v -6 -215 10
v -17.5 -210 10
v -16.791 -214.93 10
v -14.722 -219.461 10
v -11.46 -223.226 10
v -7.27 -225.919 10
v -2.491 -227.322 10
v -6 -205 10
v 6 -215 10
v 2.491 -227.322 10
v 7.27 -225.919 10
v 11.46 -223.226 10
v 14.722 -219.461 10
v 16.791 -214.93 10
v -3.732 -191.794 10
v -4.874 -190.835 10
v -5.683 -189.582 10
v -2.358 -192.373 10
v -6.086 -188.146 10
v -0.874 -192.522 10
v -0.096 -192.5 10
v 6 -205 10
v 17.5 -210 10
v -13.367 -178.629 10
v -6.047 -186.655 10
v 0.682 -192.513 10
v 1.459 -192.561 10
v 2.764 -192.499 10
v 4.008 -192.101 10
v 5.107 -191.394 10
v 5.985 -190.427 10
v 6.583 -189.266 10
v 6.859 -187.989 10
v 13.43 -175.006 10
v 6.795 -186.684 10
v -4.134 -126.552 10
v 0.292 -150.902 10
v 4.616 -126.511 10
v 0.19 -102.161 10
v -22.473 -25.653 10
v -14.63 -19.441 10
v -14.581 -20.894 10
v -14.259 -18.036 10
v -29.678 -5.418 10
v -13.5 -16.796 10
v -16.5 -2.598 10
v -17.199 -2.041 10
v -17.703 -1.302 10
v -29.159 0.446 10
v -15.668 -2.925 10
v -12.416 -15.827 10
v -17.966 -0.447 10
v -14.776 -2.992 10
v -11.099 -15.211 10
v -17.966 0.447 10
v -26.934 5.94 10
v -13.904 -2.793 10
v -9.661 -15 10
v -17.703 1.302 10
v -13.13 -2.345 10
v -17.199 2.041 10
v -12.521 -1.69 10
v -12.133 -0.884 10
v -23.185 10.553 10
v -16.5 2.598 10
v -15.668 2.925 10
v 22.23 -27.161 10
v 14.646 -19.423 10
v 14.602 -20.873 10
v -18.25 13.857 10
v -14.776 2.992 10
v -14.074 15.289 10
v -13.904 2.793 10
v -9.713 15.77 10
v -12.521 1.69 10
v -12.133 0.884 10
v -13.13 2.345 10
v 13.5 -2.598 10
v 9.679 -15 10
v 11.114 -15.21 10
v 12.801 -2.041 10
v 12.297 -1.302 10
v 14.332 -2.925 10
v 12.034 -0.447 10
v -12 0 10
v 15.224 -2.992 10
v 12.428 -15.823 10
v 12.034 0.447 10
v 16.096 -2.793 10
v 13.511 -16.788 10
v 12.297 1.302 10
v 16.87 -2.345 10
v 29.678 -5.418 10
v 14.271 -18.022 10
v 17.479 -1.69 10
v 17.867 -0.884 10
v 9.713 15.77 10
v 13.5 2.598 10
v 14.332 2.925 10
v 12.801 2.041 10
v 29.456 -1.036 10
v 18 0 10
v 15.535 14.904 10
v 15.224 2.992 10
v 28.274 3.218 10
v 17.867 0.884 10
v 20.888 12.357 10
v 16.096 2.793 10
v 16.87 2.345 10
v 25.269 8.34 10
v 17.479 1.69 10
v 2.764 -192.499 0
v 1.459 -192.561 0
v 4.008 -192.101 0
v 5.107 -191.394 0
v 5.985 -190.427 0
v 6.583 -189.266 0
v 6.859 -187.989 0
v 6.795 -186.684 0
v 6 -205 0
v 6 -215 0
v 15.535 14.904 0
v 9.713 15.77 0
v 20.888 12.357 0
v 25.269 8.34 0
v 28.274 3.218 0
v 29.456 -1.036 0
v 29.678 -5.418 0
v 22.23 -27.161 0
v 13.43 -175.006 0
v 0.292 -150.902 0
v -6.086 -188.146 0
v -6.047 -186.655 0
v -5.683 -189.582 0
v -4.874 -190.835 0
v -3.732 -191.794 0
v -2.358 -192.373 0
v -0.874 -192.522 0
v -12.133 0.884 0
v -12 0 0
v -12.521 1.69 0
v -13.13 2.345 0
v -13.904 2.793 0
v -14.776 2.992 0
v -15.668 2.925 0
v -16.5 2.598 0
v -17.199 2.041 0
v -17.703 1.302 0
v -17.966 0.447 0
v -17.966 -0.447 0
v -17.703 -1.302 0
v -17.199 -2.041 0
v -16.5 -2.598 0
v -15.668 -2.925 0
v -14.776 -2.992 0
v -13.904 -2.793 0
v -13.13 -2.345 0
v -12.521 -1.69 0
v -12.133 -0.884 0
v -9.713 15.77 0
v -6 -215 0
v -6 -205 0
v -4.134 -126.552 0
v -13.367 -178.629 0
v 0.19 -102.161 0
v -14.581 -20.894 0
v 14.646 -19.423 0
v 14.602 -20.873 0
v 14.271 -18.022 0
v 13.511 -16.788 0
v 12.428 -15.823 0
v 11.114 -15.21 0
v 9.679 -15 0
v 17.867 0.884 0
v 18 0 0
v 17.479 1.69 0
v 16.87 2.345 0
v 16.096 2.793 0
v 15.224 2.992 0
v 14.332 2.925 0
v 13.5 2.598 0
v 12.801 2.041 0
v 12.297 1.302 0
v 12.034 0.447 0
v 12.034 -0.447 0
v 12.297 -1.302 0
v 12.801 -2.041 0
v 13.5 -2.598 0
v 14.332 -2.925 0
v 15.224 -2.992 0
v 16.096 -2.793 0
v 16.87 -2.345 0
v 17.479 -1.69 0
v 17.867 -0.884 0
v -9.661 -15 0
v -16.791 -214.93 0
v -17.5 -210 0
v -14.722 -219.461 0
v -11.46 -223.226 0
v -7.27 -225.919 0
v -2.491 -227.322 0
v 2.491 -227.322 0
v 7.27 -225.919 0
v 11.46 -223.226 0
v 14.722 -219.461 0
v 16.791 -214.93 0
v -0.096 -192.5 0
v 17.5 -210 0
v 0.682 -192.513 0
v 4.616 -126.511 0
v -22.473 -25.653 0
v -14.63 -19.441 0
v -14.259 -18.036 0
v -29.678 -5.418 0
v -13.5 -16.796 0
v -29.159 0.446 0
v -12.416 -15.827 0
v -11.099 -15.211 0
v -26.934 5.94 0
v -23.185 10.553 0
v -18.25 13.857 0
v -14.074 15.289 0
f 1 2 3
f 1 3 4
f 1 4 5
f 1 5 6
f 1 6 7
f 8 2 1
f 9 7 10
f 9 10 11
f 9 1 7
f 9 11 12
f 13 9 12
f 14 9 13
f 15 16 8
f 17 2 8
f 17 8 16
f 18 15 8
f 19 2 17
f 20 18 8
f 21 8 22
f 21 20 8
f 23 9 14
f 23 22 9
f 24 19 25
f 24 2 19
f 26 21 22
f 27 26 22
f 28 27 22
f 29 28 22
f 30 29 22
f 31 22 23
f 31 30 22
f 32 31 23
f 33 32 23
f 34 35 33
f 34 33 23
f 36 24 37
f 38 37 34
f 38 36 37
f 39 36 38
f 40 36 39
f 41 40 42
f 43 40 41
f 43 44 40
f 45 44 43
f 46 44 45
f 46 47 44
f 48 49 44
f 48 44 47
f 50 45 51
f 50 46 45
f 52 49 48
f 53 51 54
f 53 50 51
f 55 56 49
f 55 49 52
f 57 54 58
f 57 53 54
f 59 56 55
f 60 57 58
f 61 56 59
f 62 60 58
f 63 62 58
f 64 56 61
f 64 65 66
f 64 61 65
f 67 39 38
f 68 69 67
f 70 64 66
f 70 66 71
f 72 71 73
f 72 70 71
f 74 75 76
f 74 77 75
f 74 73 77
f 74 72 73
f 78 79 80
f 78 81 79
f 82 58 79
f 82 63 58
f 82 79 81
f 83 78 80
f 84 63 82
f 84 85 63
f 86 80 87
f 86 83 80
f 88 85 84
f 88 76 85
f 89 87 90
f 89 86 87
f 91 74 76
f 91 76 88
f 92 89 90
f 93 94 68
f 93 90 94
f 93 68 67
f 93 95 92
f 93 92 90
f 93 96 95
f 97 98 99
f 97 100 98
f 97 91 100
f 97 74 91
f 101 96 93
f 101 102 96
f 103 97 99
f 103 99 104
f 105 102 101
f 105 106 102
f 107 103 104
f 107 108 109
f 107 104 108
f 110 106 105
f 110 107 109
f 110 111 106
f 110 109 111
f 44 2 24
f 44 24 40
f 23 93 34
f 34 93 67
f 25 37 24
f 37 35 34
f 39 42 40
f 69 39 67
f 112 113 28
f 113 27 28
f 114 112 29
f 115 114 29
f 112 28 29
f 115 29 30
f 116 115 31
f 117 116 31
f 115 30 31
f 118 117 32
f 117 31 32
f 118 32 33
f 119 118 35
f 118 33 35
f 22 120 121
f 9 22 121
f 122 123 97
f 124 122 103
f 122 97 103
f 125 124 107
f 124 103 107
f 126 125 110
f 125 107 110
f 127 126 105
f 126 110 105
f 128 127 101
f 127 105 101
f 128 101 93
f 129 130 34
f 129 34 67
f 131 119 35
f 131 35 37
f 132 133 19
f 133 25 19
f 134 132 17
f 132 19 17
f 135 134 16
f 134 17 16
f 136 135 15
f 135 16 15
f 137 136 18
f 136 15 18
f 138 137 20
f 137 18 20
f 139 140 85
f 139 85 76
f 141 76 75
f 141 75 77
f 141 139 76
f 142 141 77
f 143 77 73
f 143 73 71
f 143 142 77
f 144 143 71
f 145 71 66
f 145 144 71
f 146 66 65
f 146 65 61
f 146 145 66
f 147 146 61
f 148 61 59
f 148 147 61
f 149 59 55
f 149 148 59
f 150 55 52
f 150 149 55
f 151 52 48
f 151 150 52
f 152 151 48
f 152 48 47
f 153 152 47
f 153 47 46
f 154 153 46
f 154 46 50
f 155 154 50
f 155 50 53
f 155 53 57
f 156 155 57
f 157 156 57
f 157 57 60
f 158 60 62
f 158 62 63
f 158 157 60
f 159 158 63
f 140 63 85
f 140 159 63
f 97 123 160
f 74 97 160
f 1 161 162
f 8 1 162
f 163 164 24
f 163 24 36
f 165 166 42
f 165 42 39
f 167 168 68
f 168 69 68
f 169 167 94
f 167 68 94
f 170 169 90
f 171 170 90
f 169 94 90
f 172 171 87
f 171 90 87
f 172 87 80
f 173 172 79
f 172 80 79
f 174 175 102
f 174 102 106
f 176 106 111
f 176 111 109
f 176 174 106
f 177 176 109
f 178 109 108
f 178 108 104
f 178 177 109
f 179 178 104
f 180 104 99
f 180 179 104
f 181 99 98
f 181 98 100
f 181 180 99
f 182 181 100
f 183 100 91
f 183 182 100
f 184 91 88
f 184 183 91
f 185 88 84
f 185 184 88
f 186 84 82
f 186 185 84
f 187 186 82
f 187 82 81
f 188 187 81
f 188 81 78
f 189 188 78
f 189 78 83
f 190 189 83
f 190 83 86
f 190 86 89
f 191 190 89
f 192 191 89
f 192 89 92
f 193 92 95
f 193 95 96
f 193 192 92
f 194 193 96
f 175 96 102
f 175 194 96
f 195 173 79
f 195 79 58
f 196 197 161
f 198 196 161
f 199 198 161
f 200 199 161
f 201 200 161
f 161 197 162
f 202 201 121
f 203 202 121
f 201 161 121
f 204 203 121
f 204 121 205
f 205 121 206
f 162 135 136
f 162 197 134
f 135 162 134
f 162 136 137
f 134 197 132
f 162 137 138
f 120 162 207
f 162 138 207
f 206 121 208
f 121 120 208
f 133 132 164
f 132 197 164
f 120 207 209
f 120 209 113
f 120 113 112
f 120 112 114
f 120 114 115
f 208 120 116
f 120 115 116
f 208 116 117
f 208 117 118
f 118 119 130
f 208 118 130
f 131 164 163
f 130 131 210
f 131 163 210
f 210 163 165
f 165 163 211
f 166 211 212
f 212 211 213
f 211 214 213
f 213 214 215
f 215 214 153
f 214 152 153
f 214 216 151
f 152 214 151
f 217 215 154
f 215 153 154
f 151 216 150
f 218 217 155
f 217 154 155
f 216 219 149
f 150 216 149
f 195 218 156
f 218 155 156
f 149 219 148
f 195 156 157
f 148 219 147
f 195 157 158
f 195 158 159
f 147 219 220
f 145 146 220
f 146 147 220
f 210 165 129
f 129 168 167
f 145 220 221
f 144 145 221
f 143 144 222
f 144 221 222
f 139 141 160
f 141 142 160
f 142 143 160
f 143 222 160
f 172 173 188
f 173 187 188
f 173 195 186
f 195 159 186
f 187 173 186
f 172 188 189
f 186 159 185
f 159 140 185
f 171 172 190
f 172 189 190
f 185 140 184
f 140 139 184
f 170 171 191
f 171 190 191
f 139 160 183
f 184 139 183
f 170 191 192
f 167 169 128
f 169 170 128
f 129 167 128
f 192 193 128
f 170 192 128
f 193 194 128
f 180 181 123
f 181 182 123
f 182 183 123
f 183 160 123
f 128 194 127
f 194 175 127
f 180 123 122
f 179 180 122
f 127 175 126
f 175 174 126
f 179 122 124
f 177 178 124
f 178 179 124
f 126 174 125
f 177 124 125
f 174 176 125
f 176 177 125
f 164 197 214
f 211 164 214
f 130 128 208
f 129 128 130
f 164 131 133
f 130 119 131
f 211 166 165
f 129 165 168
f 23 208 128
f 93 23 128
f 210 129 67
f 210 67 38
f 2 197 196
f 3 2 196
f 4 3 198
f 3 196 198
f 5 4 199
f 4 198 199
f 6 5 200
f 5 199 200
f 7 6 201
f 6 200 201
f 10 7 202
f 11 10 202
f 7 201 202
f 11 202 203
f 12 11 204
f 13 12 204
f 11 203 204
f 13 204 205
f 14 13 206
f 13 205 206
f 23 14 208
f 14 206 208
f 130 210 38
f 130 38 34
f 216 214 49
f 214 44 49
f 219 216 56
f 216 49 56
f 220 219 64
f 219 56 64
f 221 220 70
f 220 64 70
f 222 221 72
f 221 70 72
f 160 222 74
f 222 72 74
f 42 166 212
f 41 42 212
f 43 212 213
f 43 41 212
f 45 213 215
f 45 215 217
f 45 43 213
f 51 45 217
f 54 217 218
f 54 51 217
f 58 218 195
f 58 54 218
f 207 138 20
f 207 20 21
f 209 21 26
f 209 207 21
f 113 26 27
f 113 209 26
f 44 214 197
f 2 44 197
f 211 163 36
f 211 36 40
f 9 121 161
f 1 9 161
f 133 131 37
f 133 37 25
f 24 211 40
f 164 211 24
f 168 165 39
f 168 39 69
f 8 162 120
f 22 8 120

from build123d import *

# Parameters (mm, degrees)
SKETCH1_R           = 3
BOSS_EXTRUDE2_DEPTH = 10
FILLET1_R           = 20
FILLET2_R           = 20
CUT_EXTRUDE1_START  = -10
CUT_EXTRUDE1_DEPTH  = 10
FILLET3_R           = 5


with BuildPart() as part:
    # Sketch1 → Boss-Extrude2 (new body)
    with BuildSketch(Plane.XY):
        with BuildLine():
            Line((-30, 15.770412854), (-30, 0))
            Line((-30, 0), (-17.5, -210))
            ThreePointArc((-17.5, -210), (0, -227.5), (17.5, -210))
            Line((17.5, -210), (30, 0))
            Line((30, 0), (30, 15.770412854))
            Line((30, 15.770412854), (-30, 15.770412854))
        make_face()
        with Locations((-15, 0)):
            Circle(SKETCH1_R, mode=Mode.SUBTRACT)
        with Locations((15, 0)):
            Circle(SKETCH1_R, mode=Mode.SUBTRACT)
        Polygon((0, -205), (6, -205), (6, -215), (-6, -215), (-6, -205), align=None, mode=Mode.SUBTRACT)
    extrude(amount=BOSS_EXTRUDE2_DEPTH)

    # Fillet1
    fillet1_edges = [part.edges().sort_by_distance(p)[0] for p in [
        (-30, 15.770412854, 5),
    ]]
    fillet(fillet1_edges, radius=FILLET1_R)

    # Fillet2
    fillet2_edges = [part.edges().sort_by_distance(p)[0] for p in [
        (30, 15.770412854, 5),
    ]]
    fillet(fillet2_edges, radius=FILLET2_R)

    # Sketch4 → Cut-Extrude1 (cut)
    with BuildSketch(Plane.XY.offset(10).offset(CUT_EXTRUDE1_START)):
        Polygon((-15.651797422, -15), (0.190220551, -102.160979768), (15.643622882, -15), (15, -15), align=None)
        Polygon((-22.473027071, -25.6531452), (-13.367328465, -178.628881795), (-4.134156204, -126.551525408), align=None)
        Polygon((22.230419841, -27.161313899), (4.615986353, -126.511039477), (13.430162671, -175.005634359), align=None)
        with BuildLine():
            Line((0.291609598, -150.901585116), (-7.372445375, -194.128735111))
            ThreePointArc((-7.372445375, -194.128735111), (0.476576628, -192.506490497), (8.225632191, -194.553674383))
            Line((8.225632191, -194.553674383), (0.291609598, -150.901585116))
        make_face()
    extrude(amount=CUT_EXTRUDE1_DEPTH, mode=Mode.SUBTRACT)

    # Fillet3
    fillet3_edges = [part.edges().sort_by_distance(p)[0] for p in [
        (8.225632191, -194.553674383, 5),
        (-7.372445375, -194.128735111, 5),
        (-15.651797422, -15, 5),
        (15.643622882, -15, 5),
    ]]
    fillet(fillet3_edges, radius=FILLET3_R)


solid = part.part
